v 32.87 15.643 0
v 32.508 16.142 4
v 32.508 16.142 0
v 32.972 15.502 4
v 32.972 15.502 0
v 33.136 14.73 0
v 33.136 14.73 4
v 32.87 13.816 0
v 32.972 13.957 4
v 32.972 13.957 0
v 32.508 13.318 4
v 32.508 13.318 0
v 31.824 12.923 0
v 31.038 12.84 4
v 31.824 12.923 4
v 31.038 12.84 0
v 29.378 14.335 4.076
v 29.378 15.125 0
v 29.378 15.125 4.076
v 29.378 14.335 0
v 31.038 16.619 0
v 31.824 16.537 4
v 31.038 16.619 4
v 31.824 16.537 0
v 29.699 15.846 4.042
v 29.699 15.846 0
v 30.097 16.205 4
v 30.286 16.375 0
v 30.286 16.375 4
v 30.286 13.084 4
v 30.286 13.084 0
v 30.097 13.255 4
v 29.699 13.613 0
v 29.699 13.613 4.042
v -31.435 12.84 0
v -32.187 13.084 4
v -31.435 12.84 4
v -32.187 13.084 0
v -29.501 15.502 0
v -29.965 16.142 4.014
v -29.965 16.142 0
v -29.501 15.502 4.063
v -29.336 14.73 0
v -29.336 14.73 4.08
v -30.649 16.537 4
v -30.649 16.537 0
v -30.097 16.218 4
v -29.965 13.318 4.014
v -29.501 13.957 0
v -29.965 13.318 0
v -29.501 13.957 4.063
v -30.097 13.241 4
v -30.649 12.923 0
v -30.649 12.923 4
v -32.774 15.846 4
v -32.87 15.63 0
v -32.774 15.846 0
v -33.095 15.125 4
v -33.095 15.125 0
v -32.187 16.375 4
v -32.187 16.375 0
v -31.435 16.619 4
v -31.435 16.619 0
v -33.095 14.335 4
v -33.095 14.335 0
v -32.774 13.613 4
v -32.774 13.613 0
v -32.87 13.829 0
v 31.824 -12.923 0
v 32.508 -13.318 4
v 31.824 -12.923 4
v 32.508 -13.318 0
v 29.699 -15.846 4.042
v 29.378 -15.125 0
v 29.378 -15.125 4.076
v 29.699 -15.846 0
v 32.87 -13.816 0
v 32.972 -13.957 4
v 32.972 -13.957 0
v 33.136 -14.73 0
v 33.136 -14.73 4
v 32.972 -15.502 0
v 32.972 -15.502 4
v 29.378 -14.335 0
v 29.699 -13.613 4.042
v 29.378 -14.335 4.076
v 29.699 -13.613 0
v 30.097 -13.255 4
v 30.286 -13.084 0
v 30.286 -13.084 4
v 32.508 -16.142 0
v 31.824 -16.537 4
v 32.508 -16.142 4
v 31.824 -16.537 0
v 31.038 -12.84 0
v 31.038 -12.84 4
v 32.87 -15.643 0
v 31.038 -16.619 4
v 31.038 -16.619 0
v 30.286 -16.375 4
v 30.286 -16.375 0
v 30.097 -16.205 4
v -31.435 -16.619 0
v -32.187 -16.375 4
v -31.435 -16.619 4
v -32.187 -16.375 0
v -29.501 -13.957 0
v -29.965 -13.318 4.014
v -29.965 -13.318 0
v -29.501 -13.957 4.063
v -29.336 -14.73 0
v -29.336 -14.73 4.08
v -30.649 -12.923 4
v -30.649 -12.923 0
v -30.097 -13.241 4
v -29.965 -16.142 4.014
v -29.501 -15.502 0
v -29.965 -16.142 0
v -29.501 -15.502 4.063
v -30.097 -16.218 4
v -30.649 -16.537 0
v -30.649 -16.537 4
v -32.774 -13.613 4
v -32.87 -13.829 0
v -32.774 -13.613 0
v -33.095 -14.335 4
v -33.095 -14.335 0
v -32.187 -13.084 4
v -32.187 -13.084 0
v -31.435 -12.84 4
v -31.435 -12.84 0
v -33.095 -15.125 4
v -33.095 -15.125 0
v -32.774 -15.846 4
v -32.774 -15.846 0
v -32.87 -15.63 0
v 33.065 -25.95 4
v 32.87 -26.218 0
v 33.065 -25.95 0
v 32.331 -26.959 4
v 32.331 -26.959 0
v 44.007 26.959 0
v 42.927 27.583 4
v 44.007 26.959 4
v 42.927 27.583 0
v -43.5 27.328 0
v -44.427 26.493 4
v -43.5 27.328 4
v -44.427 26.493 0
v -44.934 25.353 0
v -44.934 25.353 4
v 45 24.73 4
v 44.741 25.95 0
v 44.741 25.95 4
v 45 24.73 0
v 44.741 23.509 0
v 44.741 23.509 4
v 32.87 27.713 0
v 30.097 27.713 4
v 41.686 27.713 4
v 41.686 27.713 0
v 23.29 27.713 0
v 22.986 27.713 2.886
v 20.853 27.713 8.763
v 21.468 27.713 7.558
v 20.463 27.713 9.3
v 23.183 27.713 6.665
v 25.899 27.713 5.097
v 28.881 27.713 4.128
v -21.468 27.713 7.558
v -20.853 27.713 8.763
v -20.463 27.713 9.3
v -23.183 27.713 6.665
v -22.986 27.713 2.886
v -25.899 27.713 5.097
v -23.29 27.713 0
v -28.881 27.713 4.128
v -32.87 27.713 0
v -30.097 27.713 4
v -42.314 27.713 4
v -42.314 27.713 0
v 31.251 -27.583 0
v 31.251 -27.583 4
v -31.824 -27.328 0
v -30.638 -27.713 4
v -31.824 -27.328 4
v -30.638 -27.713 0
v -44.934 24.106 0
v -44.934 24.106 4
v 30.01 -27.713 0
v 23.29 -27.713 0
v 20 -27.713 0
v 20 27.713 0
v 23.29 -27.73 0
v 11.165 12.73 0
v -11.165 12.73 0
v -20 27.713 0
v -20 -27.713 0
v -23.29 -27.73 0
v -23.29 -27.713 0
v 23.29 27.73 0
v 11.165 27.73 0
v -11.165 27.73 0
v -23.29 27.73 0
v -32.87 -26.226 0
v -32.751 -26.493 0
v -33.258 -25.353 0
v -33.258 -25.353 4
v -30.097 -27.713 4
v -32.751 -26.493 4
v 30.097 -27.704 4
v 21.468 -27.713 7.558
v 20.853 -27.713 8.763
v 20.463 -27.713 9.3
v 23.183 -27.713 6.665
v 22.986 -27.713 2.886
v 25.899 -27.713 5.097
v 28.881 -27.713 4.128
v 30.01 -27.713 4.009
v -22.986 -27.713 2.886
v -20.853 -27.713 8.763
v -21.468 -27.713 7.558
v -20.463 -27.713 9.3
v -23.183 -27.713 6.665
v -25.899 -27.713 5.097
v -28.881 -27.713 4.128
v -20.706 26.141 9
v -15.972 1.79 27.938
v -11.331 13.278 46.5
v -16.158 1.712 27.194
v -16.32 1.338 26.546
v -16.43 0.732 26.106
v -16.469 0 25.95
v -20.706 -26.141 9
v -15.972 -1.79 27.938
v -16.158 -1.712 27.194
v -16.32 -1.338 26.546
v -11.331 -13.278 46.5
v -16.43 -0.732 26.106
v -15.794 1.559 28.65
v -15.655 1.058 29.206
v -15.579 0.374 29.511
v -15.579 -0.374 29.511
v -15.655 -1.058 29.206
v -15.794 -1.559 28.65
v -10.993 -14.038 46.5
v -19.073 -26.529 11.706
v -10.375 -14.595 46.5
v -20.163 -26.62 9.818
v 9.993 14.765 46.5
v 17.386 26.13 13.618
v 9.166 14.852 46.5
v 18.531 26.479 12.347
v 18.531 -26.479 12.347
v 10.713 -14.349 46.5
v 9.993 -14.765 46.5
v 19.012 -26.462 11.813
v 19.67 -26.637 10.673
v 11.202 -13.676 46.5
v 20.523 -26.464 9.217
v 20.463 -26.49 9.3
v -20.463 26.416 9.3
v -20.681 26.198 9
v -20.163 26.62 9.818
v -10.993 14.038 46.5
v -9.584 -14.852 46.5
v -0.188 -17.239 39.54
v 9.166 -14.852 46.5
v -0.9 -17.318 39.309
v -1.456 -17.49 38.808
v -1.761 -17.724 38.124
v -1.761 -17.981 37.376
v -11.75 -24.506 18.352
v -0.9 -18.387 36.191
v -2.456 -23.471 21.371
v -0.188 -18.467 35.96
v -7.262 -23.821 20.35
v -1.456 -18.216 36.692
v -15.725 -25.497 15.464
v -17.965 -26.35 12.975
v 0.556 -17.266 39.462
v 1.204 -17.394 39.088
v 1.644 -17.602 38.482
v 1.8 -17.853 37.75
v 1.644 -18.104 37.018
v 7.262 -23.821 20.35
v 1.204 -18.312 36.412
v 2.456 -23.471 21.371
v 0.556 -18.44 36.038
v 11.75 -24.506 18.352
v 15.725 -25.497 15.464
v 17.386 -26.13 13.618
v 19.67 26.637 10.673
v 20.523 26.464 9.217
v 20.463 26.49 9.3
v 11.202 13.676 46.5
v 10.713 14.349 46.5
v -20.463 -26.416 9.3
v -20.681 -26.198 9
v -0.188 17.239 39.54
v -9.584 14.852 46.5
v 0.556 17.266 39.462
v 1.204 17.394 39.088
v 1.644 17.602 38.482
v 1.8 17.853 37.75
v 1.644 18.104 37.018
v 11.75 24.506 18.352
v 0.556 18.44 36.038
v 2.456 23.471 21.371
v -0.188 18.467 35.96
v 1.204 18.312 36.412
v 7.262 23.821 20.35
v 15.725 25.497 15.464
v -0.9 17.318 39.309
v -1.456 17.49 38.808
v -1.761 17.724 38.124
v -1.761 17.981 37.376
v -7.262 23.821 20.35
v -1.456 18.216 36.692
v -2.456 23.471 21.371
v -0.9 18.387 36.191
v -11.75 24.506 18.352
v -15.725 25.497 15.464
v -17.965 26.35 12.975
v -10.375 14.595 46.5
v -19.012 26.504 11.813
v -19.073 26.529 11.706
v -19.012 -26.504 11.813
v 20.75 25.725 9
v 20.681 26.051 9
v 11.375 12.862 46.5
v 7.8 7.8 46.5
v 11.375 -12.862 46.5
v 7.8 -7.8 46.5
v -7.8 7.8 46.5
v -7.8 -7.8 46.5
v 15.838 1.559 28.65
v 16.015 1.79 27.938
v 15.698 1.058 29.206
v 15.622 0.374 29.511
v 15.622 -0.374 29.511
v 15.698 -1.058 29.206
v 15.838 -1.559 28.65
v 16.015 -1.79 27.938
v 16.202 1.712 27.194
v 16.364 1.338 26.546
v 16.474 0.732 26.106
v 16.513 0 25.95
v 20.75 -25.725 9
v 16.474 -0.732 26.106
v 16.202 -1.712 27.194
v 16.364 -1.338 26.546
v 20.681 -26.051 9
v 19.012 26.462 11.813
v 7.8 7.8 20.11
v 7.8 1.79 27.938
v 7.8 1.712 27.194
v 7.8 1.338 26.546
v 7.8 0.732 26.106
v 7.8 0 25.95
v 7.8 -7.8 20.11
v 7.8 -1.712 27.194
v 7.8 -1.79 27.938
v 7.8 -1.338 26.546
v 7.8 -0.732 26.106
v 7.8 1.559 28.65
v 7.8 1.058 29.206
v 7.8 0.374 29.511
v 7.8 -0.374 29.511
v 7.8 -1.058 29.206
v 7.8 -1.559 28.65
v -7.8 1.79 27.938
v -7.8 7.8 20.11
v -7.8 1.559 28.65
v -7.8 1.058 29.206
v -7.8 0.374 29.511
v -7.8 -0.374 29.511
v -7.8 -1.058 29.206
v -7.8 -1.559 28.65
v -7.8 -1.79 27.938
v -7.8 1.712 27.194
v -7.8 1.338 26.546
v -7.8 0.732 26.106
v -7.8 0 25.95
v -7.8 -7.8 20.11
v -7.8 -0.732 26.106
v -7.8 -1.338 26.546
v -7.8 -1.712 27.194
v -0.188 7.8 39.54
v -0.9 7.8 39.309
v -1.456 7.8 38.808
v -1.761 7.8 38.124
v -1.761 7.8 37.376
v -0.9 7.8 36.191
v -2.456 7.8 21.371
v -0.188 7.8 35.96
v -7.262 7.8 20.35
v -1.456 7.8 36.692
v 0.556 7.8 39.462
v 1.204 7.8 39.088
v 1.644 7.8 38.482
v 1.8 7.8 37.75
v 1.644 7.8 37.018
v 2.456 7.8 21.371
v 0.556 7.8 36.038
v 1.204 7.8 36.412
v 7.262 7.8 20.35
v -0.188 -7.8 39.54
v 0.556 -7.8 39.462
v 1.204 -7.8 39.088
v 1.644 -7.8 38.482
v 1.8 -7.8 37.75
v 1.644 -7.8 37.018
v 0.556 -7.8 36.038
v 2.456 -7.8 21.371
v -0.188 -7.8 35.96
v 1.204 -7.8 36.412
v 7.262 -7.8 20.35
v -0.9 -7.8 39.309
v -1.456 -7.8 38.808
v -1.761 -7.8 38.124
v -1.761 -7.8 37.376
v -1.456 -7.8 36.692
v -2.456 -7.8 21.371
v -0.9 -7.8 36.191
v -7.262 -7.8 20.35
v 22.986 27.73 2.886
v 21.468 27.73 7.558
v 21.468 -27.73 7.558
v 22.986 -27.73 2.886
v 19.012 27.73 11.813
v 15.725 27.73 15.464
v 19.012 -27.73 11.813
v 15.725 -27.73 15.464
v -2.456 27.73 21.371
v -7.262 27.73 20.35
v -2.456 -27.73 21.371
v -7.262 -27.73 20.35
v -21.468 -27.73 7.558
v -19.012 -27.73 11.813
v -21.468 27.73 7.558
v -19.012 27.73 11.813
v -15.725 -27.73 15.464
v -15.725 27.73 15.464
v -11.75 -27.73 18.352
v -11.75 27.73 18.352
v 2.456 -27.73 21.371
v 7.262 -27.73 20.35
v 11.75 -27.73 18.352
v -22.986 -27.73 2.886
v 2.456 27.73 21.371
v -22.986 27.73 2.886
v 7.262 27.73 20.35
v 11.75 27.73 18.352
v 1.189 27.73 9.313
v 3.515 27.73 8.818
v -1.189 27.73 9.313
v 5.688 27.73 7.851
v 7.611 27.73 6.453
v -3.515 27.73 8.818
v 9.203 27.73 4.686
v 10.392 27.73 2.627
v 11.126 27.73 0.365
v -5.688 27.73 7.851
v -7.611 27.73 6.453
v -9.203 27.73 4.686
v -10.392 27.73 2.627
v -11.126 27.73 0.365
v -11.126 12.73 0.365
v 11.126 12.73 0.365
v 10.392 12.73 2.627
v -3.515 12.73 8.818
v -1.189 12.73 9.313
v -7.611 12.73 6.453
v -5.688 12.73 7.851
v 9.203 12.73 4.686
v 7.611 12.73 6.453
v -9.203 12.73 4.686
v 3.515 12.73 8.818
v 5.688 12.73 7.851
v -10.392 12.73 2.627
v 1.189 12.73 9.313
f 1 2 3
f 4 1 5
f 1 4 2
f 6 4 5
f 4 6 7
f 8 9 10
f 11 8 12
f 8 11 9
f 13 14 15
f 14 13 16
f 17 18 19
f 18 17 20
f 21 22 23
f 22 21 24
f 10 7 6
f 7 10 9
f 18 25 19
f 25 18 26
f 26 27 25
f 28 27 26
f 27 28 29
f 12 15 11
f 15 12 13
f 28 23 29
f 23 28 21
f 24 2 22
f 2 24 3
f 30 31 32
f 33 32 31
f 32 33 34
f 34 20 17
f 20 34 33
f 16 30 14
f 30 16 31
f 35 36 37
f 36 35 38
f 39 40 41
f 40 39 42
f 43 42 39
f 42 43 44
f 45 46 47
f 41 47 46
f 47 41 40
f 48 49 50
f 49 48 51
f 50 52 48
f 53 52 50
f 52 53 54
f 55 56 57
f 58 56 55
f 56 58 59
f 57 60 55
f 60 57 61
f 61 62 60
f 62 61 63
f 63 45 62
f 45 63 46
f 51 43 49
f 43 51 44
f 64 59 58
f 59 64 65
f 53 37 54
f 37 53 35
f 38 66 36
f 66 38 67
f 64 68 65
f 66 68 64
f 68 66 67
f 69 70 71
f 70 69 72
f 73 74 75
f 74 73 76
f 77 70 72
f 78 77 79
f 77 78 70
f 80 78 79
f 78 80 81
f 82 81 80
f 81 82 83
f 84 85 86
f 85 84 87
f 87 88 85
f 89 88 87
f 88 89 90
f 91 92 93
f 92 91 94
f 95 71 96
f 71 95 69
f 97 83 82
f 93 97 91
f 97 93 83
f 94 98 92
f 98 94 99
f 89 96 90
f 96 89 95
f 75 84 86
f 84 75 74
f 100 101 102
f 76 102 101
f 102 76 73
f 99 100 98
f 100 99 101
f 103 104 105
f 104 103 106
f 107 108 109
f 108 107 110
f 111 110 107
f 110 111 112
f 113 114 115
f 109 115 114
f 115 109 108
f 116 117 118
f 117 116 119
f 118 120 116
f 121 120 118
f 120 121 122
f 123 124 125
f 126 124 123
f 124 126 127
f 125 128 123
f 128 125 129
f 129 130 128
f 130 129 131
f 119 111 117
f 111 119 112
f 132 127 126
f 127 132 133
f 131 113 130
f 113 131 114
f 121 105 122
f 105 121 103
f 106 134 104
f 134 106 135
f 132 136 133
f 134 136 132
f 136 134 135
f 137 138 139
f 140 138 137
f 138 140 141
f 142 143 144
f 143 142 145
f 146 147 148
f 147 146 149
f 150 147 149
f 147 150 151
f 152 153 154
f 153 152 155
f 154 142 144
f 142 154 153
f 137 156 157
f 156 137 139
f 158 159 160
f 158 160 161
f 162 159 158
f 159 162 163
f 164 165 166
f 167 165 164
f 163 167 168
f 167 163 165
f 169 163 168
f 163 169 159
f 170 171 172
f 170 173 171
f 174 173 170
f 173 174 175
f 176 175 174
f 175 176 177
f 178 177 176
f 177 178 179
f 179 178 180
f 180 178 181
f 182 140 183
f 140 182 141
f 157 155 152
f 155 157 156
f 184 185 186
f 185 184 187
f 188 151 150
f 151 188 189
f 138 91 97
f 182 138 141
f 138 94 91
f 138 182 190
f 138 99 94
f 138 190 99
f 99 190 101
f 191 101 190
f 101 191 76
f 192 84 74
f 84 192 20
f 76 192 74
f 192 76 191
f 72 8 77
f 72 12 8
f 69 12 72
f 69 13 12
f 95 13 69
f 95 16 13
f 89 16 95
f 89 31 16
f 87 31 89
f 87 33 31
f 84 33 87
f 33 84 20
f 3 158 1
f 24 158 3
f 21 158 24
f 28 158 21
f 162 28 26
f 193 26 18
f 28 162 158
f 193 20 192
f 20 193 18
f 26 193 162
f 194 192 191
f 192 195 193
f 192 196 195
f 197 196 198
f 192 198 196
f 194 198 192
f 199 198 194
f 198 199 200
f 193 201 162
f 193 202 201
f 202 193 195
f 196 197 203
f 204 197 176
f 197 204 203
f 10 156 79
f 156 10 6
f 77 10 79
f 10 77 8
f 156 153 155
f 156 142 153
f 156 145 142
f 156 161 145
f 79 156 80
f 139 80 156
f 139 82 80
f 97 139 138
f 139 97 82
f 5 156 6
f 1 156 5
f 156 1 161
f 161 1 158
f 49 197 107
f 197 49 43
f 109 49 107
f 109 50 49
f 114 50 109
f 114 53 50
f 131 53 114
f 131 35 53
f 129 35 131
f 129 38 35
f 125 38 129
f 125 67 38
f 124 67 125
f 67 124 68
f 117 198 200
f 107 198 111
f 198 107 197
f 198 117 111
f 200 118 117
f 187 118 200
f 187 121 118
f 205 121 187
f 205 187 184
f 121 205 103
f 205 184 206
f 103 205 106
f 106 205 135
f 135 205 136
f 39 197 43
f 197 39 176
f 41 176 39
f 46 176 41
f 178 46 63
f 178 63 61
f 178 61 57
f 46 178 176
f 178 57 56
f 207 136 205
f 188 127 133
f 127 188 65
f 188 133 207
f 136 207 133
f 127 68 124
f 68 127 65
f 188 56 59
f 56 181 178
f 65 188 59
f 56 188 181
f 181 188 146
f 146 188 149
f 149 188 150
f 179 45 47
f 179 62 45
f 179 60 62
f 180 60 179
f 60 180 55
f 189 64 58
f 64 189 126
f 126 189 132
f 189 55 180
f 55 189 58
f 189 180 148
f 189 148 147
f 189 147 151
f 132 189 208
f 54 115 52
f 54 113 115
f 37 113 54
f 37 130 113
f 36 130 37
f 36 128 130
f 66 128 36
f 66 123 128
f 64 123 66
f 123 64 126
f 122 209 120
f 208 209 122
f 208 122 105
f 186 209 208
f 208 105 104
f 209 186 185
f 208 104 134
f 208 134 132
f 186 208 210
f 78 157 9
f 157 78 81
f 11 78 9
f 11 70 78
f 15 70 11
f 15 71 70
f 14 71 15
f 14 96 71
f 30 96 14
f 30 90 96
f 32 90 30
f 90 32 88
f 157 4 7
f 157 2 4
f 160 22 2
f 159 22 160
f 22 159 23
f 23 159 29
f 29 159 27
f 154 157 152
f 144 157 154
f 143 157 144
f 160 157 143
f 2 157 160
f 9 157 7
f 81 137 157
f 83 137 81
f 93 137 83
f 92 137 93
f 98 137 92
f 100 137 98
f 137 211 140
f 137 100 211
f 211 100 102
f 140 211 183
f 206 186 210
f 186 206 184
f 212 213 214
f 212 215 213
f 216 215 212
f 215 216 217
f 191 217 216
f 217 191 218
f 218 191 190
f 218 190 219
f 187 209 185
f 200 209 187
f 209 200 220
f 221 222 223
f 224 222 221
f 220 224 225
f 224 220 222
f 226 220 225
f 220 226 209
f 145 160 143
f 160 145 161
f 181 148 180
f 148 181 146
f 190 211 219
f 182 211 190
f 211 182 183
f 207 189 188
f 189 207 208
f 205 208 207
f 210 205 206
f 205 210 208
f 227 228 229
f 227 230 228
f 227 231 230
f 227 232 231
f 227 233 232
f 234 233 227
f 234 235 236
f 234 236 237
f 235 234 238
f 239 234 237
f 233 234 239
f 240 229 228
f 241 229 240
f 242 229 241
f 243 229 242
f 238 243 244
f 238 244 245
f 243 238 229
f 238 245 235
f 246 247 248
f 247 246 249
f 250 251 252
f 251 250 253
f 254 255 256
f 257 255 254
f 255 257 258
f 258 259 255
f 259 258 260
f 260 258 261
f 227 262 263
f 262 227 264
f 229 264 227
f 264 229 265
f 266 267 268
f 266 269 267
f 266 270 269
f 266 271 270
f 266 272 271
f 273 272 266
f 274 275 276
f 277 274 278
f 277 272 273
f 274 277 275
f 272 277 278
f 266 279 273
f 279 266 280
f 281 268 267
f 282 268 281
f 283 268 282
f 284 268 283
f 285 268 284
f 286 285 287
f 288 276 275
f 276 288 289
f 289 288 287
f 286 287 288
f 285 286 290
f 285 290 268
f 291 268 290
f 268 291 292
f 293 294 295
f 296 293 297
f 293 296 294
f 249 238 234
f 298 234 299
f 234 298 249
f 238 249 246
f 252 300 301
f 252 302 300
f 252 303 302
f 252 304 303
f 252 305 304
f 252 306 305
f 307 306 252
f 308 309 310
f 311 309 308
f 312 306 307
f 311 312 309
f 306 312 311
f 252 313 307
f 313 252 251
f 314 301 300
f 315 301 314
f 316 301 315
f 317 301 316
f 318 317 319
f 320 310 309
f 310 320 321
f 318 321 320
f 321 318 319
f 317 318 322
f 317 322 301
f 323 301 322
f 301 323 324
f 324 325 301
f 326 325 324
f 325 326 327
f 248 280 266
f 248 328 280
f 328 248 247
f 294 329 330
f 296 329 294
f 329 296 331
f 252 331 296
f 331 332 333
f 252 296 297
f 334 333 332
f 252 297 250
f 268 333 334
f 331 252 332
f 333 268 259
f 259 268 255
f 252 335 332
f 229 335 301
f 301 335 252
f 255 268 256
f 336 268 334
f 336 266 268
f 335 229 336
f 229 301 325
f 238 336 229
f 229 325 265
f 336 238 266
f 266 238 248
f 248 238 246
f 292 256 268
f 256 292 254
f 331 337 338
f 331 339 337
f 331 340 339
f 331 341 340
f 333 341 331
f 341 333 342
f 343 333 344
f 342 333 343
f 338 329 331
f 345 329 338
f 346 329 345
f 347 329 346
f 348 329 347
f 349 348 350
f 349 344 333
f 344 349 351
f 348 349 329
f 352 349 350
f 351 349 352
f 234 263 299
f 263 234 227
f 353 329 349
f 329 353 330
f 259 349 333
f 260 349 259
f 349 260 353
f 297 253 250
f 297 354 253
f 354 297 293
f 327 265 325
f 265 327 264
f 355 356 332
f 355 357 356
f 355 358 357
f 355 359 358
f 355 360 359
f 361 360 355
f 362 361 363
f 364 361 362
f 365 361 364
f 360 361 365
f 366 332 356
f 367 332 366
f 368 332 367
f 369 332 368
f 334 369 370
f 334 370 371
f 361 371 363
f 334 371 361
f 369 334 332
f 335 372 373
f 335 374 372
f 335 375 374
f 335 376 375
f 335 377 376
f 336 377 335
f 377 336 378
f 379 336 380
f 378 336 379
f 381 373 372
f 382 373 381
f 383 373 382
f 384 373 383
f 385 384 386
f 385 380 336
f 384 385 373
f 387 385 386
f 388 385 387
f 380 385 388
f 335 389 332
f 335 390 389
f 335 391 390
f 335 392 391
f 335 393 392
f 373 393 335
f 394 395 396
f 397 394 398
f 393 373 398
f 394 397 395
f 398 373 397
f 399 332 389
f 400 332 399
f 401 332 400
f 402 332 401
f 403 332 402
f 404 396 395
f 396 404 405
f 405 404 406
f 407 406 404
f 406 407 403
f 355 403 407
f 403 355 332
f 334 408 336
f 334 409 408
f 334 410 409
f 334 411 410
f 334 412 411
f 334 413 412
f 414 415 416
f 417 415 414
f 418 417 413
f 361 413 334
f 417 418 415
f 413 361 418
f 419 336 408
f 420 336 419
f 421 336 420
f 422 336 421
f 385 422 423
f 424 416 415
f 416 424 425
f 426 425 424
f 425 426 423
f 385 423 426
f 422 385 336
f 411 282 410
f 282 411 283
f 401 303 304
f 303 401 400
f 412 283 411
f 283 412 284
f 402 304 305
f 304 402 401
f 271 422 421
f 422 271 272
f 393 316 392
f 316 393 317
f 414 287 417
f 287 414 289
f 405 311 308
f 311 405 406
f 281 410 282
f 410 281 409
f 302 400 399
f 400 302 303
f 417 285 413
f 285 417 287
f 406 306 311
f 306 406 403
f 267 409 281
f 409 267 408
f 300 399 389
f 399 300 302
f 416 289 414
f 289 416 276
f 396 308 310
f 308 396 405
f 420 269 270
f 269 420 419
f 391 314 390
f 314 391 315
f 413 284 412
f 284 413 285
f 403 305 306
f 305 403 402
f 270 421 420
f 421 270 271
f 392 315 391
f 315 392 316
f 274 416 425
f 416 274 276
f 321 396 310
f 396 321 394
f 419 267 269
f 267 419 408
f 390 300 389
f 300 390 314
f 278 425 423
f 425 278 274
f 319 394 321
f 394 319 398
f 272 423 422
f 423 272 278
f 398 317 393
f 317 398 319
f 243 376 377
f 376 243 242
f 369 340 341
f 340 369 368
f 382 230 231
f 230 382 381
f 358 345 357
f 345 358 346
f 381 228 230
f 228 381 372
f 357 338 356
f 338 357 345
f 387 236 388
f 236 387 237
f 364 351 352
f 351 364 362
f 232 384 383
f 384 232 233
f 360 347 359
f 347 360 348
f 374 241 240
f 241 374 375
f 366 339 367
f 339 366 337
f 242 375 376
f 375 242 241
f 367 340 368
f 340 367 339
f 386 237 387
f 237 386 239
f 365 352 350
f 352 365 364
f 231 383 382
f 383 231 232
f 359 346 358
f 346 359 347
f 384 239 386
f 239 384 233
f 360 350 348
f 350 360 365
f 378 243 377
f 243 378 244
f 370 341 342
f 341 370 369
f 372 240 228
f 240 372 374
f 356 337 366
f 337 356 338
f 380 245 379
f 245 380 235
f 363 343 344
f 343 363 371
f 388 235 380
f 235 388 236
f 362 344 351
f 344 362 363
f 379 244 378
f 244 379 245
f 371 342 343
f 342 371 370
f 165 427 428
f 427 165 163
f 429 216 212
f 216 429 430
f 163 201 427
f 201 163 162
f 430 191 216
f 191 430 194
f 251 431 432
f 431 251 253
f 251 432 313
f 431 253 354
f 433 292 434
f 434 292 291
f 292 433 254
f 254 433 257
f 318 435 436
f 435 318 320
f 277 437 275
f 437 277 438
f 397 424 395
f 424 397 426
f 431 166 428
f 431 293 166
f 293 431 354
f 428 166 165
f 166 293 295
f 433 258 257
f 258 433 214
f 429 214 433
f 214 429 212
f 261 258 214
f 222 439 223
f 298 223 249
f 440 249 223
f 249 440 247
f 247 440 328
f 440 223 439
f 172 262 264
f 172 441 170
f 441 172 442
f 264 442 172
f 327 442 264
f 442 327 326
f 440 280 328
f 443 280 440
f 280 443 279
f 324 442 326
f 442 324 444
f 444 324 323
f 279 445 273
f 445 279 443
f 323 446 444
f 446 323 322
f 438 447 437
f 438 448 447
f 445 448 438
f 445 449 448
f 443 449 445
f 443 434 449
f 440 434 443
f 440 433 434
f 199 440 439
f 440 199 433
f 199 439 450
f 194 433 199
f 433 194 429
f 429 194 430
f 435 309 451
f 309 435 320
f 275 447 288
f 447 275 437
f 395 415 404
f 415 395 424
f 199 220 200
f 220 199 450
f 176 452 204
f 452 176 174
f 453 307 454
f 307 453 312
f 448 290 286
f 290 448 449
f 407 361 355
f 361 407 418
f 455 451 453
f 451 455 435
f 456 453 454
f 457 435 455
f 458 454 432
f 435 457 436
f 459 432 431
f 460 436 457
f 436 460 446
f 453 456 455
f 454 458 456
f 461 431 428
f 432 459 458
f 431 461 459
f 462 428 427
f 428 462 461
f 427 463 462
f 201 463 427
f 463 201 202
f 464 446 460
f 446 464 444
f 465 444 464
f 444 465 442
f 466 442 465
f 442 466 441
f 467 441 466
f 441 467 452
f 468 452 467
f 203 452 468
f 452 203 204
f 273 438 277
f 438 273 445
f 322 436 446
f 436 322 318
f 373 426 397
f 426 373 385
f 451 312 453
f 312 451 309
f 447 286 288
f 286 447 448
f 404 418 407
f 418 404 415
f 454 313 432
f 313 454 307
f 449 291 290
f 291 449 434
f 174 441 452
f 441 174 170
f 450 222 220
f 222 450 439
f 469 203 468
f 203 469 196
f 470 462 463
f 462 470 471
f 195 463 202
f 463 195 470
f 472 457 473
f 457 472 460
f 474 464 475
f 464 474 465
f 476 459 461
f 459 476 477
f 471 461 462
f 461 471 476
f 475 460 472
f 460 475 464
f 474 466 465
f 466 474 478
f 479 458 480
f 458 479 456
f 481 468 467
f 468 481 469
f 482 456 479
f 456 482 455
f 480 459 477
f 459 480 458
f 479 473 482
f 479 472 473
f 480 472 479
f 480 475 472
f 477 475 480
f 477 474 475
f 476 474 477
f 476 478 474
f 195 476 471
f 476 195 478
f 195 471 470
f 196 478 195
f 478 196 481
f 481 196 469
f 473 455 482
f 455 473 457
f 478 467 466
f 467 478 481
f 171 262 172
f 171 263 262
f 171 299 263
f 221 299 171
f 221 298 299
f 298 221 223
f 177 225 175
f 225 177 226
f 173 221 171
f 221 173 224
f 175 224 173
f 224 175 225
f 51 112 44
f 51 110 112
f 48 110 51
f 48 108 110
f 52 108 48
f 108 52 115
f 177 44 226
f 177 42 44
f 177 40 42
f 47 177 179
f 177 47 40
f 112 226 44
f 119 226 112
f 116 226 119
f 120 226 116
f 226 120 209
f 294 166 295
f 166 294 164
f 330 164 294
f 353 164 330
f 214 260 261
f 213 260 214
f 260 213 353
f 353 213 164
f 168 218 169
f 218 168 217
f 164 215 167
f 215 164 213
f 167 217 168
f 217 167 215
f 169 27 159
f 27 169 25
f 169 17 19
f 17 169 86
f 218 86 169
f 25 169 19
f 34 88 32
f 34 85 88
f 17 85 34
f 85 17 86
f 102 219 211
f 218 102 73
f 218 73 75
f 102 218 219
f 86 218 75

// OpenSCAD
open_beam = 15; //open beam dimensions (square)
perspex_width = 5;
bearing_od = 22;
bearing_id = 8;
hole_space = 65.673;//hole spacing on perspex round plate
hole_to_front_edge = 13;
r_corners = 3;
plate_thickness = 4;
extrusion=0.3;

//variables for thingiverse obtained cylinder rounding tool
pad = 0.1;	// Padding to maintain manifold
ch = 15;
cr = 25;
ct = 1;
r = 10;
smooth = 180;	// Number of facets of rounding cylinder
//variables for edge fillet
b = 13;
h = 20;
w = 90*0.5888888+r_corners;

//===========================================================================================
//===========================================================================================

module plate_fixture(length, thickness){
	difference(){
		hull(){
			translate([length/2, (length*0.5888)/2, 0])cylinder(r=r_corners, h=thickness, $fn=15);
			translate([-length/2, (length*0.5888)/2, 0])cylinder(r=r_corners, h=thickness, $fn=15);
			translate([-(length*0.722)/2, -(length*0.5888)/2, 0])cylinder(r=r_corners, h=thickness, $fn=15);
			translate([(length*0.722)/2, -(length*0.5888)/2, 0])cylinder(r=r_corners, h=thickness, $fn=15);

		}
		union(){
			translate([(hole_space)/2-1.6, (length*0.5888)/2-13+r_corners, -1])cylinder(r=1.6+extrusion, h=thickness+2, $fn=15);
			translate([(-hole_space)/2+1.6, (length*0.5888)/2-13+r_corners, -1])cylinder(r=1.6+extrusion, h=thickness+2, $fn=15);
			translate([(hole_space)/2-1.6, -(length*0.5888)/2+13-r_corners, -1])cylinder(r=1.6+extrusion, h=thickness+2, $fn=15);
			translate([(-hole_space)/2+1.6, -(length*0.5888)/2+13-r_corners, -1])cylinder(r=1.6+extrusion, h=thickness+2, $fn=15);
		}
	}
}
//===========================================================================================
//===========================================================================================
module bearing_slot(od, id, width, length){
	rotate([90,0,0])
	translate([0, -plate_thickness/2, -(length*0.5888)/2-r_corners])
	//difference(){
		cylinder(d=od+extrusion*2.5, h=width*2+1);
		//cylinder(d=id, h=width);
	//}
}
//===========================================================================================
//===========================================================================================
module reinforcement(length){
	rotate([90,0,0])
	translate([0, -plate_thickness/2, -(length*0.5888)/2-r_corners])
	cylinder(r=23.5, h=(length*0.5888)+2*r_corners);
	}
//===========================================================================================
//===========================================================================================
module top_half(){
translate([0, 0, -100])
cube(size=[200, 200, 200], center=true);

}
//===========================================================================================
//===========================================================================================
module bot_half(){
translate([0, 0, 100])
cube(size=[200, 200, 200], center=true);

}
//===========================================================================================
//===========================================================================================
module cylinder_fillet(){
	// Inside Fillet
	translate([0, -90*0.65/2, 0])
	rotate([-90, 0, 0])
	difference() {
		rotate_extrude(convexity=10,  $fn = smooth)
			translate([cr-ct-r+pad,ct-pad,0])
				square(r+pad,r+pad);
		rotate_extrude(convexity=10,  $fn = smooth)
			translate([cr-ct-r,ct+r,0])
				circle(r=r,$fn=smooth);
	}


}
//===========================================================================================
//===========================================================================================
module open_beam_slot(ob_dim, ob_h){//open beam fixture on lower bearing lock (ob_dim = width and length of open beam extrusion)
	translate([0, 0, 9])
	difference(){
		difference(){
			translate([-(ob_dim+ob_dim/3*2)/2, -(ob_dim+ob_dim/3*2)/2, 0])
			minkowski(){
				linear_extrude(height = ob_dim*ob_h, convexity = 10, twist = 0, scale = 0.5)
				square([ob_dim+ob_dim*1.5, ob_dim+ob_dim*2.43], center = true);
				translate([(ob_dim+ob_dim/3*2)/2, (ob_dim+ob_dim/3*2)/2, 0])cylinder(r=2, h=0.000005, center = true, $fn=15);
			}
			cube([ob_dim+extrusion*2, ob_dim+extrusion*2, ob_dim*ob_h*2+3], center=true);
		}
		
		union(){
		translate([0, 0, ob_dim*ob_h/2+10])
		rotate([90, 0, 0])cylinder(r=1.5+extrusion, h=ob_dim*ob_h+100, center = true, $fn=15);
		translate([0, 0, ob_dim*ob_h/2])
		rotate([0, 90, 0])cylinder(r=1.5+extrusion, h=ob_dim*ob_h+100, center = true, $fn=15);
		}
	}
}
//===========================================================================================
//===========================================================================================
module edge_fillet(){
	//Start with an extruded triangle

	rotate(a=[90,-90,0])
		difference(){
			linear_extrude(height = w, center = true, convexity = 10, twist = 0)
				polygon(points=[[0,0],[h,0],[0,b]], paths=[[0,1,2]]);
			translate([h-1, b-1, -w/2])cylinder(r=15, h=w, $fn=30);
		}

}

//===========================================================================================
// 												MAIN
//===========================================================================================

module main(){
	difference(){	
	difference(){
		union(){
			translate([0, 0, -5-plate_thickness])plate_fixture(90-2*r_corners);
			plate_fixture(90-2*r_corners, 4);
			//difference(){
				reinforcement(90-2*r_corners);
				//cylinder_fillet();
			//}
			open_beam_slot(15, 2.5);
		}
		bearing_slot(bearing_od, bearing_id, 7, 90-2*r_corners);

	}
	top_half();
	}
}


main();
intersection(){
plate_fixture(90-2*r_corners, 20);
translate([-20, 0, -0.2])
edge_fillet();
}

intersection(){
plate_fixture(90-2*r_corners, 20);
rotate([0, 0, 180])
translate([-20, 0, -0.2])
edge_fillet();
}
